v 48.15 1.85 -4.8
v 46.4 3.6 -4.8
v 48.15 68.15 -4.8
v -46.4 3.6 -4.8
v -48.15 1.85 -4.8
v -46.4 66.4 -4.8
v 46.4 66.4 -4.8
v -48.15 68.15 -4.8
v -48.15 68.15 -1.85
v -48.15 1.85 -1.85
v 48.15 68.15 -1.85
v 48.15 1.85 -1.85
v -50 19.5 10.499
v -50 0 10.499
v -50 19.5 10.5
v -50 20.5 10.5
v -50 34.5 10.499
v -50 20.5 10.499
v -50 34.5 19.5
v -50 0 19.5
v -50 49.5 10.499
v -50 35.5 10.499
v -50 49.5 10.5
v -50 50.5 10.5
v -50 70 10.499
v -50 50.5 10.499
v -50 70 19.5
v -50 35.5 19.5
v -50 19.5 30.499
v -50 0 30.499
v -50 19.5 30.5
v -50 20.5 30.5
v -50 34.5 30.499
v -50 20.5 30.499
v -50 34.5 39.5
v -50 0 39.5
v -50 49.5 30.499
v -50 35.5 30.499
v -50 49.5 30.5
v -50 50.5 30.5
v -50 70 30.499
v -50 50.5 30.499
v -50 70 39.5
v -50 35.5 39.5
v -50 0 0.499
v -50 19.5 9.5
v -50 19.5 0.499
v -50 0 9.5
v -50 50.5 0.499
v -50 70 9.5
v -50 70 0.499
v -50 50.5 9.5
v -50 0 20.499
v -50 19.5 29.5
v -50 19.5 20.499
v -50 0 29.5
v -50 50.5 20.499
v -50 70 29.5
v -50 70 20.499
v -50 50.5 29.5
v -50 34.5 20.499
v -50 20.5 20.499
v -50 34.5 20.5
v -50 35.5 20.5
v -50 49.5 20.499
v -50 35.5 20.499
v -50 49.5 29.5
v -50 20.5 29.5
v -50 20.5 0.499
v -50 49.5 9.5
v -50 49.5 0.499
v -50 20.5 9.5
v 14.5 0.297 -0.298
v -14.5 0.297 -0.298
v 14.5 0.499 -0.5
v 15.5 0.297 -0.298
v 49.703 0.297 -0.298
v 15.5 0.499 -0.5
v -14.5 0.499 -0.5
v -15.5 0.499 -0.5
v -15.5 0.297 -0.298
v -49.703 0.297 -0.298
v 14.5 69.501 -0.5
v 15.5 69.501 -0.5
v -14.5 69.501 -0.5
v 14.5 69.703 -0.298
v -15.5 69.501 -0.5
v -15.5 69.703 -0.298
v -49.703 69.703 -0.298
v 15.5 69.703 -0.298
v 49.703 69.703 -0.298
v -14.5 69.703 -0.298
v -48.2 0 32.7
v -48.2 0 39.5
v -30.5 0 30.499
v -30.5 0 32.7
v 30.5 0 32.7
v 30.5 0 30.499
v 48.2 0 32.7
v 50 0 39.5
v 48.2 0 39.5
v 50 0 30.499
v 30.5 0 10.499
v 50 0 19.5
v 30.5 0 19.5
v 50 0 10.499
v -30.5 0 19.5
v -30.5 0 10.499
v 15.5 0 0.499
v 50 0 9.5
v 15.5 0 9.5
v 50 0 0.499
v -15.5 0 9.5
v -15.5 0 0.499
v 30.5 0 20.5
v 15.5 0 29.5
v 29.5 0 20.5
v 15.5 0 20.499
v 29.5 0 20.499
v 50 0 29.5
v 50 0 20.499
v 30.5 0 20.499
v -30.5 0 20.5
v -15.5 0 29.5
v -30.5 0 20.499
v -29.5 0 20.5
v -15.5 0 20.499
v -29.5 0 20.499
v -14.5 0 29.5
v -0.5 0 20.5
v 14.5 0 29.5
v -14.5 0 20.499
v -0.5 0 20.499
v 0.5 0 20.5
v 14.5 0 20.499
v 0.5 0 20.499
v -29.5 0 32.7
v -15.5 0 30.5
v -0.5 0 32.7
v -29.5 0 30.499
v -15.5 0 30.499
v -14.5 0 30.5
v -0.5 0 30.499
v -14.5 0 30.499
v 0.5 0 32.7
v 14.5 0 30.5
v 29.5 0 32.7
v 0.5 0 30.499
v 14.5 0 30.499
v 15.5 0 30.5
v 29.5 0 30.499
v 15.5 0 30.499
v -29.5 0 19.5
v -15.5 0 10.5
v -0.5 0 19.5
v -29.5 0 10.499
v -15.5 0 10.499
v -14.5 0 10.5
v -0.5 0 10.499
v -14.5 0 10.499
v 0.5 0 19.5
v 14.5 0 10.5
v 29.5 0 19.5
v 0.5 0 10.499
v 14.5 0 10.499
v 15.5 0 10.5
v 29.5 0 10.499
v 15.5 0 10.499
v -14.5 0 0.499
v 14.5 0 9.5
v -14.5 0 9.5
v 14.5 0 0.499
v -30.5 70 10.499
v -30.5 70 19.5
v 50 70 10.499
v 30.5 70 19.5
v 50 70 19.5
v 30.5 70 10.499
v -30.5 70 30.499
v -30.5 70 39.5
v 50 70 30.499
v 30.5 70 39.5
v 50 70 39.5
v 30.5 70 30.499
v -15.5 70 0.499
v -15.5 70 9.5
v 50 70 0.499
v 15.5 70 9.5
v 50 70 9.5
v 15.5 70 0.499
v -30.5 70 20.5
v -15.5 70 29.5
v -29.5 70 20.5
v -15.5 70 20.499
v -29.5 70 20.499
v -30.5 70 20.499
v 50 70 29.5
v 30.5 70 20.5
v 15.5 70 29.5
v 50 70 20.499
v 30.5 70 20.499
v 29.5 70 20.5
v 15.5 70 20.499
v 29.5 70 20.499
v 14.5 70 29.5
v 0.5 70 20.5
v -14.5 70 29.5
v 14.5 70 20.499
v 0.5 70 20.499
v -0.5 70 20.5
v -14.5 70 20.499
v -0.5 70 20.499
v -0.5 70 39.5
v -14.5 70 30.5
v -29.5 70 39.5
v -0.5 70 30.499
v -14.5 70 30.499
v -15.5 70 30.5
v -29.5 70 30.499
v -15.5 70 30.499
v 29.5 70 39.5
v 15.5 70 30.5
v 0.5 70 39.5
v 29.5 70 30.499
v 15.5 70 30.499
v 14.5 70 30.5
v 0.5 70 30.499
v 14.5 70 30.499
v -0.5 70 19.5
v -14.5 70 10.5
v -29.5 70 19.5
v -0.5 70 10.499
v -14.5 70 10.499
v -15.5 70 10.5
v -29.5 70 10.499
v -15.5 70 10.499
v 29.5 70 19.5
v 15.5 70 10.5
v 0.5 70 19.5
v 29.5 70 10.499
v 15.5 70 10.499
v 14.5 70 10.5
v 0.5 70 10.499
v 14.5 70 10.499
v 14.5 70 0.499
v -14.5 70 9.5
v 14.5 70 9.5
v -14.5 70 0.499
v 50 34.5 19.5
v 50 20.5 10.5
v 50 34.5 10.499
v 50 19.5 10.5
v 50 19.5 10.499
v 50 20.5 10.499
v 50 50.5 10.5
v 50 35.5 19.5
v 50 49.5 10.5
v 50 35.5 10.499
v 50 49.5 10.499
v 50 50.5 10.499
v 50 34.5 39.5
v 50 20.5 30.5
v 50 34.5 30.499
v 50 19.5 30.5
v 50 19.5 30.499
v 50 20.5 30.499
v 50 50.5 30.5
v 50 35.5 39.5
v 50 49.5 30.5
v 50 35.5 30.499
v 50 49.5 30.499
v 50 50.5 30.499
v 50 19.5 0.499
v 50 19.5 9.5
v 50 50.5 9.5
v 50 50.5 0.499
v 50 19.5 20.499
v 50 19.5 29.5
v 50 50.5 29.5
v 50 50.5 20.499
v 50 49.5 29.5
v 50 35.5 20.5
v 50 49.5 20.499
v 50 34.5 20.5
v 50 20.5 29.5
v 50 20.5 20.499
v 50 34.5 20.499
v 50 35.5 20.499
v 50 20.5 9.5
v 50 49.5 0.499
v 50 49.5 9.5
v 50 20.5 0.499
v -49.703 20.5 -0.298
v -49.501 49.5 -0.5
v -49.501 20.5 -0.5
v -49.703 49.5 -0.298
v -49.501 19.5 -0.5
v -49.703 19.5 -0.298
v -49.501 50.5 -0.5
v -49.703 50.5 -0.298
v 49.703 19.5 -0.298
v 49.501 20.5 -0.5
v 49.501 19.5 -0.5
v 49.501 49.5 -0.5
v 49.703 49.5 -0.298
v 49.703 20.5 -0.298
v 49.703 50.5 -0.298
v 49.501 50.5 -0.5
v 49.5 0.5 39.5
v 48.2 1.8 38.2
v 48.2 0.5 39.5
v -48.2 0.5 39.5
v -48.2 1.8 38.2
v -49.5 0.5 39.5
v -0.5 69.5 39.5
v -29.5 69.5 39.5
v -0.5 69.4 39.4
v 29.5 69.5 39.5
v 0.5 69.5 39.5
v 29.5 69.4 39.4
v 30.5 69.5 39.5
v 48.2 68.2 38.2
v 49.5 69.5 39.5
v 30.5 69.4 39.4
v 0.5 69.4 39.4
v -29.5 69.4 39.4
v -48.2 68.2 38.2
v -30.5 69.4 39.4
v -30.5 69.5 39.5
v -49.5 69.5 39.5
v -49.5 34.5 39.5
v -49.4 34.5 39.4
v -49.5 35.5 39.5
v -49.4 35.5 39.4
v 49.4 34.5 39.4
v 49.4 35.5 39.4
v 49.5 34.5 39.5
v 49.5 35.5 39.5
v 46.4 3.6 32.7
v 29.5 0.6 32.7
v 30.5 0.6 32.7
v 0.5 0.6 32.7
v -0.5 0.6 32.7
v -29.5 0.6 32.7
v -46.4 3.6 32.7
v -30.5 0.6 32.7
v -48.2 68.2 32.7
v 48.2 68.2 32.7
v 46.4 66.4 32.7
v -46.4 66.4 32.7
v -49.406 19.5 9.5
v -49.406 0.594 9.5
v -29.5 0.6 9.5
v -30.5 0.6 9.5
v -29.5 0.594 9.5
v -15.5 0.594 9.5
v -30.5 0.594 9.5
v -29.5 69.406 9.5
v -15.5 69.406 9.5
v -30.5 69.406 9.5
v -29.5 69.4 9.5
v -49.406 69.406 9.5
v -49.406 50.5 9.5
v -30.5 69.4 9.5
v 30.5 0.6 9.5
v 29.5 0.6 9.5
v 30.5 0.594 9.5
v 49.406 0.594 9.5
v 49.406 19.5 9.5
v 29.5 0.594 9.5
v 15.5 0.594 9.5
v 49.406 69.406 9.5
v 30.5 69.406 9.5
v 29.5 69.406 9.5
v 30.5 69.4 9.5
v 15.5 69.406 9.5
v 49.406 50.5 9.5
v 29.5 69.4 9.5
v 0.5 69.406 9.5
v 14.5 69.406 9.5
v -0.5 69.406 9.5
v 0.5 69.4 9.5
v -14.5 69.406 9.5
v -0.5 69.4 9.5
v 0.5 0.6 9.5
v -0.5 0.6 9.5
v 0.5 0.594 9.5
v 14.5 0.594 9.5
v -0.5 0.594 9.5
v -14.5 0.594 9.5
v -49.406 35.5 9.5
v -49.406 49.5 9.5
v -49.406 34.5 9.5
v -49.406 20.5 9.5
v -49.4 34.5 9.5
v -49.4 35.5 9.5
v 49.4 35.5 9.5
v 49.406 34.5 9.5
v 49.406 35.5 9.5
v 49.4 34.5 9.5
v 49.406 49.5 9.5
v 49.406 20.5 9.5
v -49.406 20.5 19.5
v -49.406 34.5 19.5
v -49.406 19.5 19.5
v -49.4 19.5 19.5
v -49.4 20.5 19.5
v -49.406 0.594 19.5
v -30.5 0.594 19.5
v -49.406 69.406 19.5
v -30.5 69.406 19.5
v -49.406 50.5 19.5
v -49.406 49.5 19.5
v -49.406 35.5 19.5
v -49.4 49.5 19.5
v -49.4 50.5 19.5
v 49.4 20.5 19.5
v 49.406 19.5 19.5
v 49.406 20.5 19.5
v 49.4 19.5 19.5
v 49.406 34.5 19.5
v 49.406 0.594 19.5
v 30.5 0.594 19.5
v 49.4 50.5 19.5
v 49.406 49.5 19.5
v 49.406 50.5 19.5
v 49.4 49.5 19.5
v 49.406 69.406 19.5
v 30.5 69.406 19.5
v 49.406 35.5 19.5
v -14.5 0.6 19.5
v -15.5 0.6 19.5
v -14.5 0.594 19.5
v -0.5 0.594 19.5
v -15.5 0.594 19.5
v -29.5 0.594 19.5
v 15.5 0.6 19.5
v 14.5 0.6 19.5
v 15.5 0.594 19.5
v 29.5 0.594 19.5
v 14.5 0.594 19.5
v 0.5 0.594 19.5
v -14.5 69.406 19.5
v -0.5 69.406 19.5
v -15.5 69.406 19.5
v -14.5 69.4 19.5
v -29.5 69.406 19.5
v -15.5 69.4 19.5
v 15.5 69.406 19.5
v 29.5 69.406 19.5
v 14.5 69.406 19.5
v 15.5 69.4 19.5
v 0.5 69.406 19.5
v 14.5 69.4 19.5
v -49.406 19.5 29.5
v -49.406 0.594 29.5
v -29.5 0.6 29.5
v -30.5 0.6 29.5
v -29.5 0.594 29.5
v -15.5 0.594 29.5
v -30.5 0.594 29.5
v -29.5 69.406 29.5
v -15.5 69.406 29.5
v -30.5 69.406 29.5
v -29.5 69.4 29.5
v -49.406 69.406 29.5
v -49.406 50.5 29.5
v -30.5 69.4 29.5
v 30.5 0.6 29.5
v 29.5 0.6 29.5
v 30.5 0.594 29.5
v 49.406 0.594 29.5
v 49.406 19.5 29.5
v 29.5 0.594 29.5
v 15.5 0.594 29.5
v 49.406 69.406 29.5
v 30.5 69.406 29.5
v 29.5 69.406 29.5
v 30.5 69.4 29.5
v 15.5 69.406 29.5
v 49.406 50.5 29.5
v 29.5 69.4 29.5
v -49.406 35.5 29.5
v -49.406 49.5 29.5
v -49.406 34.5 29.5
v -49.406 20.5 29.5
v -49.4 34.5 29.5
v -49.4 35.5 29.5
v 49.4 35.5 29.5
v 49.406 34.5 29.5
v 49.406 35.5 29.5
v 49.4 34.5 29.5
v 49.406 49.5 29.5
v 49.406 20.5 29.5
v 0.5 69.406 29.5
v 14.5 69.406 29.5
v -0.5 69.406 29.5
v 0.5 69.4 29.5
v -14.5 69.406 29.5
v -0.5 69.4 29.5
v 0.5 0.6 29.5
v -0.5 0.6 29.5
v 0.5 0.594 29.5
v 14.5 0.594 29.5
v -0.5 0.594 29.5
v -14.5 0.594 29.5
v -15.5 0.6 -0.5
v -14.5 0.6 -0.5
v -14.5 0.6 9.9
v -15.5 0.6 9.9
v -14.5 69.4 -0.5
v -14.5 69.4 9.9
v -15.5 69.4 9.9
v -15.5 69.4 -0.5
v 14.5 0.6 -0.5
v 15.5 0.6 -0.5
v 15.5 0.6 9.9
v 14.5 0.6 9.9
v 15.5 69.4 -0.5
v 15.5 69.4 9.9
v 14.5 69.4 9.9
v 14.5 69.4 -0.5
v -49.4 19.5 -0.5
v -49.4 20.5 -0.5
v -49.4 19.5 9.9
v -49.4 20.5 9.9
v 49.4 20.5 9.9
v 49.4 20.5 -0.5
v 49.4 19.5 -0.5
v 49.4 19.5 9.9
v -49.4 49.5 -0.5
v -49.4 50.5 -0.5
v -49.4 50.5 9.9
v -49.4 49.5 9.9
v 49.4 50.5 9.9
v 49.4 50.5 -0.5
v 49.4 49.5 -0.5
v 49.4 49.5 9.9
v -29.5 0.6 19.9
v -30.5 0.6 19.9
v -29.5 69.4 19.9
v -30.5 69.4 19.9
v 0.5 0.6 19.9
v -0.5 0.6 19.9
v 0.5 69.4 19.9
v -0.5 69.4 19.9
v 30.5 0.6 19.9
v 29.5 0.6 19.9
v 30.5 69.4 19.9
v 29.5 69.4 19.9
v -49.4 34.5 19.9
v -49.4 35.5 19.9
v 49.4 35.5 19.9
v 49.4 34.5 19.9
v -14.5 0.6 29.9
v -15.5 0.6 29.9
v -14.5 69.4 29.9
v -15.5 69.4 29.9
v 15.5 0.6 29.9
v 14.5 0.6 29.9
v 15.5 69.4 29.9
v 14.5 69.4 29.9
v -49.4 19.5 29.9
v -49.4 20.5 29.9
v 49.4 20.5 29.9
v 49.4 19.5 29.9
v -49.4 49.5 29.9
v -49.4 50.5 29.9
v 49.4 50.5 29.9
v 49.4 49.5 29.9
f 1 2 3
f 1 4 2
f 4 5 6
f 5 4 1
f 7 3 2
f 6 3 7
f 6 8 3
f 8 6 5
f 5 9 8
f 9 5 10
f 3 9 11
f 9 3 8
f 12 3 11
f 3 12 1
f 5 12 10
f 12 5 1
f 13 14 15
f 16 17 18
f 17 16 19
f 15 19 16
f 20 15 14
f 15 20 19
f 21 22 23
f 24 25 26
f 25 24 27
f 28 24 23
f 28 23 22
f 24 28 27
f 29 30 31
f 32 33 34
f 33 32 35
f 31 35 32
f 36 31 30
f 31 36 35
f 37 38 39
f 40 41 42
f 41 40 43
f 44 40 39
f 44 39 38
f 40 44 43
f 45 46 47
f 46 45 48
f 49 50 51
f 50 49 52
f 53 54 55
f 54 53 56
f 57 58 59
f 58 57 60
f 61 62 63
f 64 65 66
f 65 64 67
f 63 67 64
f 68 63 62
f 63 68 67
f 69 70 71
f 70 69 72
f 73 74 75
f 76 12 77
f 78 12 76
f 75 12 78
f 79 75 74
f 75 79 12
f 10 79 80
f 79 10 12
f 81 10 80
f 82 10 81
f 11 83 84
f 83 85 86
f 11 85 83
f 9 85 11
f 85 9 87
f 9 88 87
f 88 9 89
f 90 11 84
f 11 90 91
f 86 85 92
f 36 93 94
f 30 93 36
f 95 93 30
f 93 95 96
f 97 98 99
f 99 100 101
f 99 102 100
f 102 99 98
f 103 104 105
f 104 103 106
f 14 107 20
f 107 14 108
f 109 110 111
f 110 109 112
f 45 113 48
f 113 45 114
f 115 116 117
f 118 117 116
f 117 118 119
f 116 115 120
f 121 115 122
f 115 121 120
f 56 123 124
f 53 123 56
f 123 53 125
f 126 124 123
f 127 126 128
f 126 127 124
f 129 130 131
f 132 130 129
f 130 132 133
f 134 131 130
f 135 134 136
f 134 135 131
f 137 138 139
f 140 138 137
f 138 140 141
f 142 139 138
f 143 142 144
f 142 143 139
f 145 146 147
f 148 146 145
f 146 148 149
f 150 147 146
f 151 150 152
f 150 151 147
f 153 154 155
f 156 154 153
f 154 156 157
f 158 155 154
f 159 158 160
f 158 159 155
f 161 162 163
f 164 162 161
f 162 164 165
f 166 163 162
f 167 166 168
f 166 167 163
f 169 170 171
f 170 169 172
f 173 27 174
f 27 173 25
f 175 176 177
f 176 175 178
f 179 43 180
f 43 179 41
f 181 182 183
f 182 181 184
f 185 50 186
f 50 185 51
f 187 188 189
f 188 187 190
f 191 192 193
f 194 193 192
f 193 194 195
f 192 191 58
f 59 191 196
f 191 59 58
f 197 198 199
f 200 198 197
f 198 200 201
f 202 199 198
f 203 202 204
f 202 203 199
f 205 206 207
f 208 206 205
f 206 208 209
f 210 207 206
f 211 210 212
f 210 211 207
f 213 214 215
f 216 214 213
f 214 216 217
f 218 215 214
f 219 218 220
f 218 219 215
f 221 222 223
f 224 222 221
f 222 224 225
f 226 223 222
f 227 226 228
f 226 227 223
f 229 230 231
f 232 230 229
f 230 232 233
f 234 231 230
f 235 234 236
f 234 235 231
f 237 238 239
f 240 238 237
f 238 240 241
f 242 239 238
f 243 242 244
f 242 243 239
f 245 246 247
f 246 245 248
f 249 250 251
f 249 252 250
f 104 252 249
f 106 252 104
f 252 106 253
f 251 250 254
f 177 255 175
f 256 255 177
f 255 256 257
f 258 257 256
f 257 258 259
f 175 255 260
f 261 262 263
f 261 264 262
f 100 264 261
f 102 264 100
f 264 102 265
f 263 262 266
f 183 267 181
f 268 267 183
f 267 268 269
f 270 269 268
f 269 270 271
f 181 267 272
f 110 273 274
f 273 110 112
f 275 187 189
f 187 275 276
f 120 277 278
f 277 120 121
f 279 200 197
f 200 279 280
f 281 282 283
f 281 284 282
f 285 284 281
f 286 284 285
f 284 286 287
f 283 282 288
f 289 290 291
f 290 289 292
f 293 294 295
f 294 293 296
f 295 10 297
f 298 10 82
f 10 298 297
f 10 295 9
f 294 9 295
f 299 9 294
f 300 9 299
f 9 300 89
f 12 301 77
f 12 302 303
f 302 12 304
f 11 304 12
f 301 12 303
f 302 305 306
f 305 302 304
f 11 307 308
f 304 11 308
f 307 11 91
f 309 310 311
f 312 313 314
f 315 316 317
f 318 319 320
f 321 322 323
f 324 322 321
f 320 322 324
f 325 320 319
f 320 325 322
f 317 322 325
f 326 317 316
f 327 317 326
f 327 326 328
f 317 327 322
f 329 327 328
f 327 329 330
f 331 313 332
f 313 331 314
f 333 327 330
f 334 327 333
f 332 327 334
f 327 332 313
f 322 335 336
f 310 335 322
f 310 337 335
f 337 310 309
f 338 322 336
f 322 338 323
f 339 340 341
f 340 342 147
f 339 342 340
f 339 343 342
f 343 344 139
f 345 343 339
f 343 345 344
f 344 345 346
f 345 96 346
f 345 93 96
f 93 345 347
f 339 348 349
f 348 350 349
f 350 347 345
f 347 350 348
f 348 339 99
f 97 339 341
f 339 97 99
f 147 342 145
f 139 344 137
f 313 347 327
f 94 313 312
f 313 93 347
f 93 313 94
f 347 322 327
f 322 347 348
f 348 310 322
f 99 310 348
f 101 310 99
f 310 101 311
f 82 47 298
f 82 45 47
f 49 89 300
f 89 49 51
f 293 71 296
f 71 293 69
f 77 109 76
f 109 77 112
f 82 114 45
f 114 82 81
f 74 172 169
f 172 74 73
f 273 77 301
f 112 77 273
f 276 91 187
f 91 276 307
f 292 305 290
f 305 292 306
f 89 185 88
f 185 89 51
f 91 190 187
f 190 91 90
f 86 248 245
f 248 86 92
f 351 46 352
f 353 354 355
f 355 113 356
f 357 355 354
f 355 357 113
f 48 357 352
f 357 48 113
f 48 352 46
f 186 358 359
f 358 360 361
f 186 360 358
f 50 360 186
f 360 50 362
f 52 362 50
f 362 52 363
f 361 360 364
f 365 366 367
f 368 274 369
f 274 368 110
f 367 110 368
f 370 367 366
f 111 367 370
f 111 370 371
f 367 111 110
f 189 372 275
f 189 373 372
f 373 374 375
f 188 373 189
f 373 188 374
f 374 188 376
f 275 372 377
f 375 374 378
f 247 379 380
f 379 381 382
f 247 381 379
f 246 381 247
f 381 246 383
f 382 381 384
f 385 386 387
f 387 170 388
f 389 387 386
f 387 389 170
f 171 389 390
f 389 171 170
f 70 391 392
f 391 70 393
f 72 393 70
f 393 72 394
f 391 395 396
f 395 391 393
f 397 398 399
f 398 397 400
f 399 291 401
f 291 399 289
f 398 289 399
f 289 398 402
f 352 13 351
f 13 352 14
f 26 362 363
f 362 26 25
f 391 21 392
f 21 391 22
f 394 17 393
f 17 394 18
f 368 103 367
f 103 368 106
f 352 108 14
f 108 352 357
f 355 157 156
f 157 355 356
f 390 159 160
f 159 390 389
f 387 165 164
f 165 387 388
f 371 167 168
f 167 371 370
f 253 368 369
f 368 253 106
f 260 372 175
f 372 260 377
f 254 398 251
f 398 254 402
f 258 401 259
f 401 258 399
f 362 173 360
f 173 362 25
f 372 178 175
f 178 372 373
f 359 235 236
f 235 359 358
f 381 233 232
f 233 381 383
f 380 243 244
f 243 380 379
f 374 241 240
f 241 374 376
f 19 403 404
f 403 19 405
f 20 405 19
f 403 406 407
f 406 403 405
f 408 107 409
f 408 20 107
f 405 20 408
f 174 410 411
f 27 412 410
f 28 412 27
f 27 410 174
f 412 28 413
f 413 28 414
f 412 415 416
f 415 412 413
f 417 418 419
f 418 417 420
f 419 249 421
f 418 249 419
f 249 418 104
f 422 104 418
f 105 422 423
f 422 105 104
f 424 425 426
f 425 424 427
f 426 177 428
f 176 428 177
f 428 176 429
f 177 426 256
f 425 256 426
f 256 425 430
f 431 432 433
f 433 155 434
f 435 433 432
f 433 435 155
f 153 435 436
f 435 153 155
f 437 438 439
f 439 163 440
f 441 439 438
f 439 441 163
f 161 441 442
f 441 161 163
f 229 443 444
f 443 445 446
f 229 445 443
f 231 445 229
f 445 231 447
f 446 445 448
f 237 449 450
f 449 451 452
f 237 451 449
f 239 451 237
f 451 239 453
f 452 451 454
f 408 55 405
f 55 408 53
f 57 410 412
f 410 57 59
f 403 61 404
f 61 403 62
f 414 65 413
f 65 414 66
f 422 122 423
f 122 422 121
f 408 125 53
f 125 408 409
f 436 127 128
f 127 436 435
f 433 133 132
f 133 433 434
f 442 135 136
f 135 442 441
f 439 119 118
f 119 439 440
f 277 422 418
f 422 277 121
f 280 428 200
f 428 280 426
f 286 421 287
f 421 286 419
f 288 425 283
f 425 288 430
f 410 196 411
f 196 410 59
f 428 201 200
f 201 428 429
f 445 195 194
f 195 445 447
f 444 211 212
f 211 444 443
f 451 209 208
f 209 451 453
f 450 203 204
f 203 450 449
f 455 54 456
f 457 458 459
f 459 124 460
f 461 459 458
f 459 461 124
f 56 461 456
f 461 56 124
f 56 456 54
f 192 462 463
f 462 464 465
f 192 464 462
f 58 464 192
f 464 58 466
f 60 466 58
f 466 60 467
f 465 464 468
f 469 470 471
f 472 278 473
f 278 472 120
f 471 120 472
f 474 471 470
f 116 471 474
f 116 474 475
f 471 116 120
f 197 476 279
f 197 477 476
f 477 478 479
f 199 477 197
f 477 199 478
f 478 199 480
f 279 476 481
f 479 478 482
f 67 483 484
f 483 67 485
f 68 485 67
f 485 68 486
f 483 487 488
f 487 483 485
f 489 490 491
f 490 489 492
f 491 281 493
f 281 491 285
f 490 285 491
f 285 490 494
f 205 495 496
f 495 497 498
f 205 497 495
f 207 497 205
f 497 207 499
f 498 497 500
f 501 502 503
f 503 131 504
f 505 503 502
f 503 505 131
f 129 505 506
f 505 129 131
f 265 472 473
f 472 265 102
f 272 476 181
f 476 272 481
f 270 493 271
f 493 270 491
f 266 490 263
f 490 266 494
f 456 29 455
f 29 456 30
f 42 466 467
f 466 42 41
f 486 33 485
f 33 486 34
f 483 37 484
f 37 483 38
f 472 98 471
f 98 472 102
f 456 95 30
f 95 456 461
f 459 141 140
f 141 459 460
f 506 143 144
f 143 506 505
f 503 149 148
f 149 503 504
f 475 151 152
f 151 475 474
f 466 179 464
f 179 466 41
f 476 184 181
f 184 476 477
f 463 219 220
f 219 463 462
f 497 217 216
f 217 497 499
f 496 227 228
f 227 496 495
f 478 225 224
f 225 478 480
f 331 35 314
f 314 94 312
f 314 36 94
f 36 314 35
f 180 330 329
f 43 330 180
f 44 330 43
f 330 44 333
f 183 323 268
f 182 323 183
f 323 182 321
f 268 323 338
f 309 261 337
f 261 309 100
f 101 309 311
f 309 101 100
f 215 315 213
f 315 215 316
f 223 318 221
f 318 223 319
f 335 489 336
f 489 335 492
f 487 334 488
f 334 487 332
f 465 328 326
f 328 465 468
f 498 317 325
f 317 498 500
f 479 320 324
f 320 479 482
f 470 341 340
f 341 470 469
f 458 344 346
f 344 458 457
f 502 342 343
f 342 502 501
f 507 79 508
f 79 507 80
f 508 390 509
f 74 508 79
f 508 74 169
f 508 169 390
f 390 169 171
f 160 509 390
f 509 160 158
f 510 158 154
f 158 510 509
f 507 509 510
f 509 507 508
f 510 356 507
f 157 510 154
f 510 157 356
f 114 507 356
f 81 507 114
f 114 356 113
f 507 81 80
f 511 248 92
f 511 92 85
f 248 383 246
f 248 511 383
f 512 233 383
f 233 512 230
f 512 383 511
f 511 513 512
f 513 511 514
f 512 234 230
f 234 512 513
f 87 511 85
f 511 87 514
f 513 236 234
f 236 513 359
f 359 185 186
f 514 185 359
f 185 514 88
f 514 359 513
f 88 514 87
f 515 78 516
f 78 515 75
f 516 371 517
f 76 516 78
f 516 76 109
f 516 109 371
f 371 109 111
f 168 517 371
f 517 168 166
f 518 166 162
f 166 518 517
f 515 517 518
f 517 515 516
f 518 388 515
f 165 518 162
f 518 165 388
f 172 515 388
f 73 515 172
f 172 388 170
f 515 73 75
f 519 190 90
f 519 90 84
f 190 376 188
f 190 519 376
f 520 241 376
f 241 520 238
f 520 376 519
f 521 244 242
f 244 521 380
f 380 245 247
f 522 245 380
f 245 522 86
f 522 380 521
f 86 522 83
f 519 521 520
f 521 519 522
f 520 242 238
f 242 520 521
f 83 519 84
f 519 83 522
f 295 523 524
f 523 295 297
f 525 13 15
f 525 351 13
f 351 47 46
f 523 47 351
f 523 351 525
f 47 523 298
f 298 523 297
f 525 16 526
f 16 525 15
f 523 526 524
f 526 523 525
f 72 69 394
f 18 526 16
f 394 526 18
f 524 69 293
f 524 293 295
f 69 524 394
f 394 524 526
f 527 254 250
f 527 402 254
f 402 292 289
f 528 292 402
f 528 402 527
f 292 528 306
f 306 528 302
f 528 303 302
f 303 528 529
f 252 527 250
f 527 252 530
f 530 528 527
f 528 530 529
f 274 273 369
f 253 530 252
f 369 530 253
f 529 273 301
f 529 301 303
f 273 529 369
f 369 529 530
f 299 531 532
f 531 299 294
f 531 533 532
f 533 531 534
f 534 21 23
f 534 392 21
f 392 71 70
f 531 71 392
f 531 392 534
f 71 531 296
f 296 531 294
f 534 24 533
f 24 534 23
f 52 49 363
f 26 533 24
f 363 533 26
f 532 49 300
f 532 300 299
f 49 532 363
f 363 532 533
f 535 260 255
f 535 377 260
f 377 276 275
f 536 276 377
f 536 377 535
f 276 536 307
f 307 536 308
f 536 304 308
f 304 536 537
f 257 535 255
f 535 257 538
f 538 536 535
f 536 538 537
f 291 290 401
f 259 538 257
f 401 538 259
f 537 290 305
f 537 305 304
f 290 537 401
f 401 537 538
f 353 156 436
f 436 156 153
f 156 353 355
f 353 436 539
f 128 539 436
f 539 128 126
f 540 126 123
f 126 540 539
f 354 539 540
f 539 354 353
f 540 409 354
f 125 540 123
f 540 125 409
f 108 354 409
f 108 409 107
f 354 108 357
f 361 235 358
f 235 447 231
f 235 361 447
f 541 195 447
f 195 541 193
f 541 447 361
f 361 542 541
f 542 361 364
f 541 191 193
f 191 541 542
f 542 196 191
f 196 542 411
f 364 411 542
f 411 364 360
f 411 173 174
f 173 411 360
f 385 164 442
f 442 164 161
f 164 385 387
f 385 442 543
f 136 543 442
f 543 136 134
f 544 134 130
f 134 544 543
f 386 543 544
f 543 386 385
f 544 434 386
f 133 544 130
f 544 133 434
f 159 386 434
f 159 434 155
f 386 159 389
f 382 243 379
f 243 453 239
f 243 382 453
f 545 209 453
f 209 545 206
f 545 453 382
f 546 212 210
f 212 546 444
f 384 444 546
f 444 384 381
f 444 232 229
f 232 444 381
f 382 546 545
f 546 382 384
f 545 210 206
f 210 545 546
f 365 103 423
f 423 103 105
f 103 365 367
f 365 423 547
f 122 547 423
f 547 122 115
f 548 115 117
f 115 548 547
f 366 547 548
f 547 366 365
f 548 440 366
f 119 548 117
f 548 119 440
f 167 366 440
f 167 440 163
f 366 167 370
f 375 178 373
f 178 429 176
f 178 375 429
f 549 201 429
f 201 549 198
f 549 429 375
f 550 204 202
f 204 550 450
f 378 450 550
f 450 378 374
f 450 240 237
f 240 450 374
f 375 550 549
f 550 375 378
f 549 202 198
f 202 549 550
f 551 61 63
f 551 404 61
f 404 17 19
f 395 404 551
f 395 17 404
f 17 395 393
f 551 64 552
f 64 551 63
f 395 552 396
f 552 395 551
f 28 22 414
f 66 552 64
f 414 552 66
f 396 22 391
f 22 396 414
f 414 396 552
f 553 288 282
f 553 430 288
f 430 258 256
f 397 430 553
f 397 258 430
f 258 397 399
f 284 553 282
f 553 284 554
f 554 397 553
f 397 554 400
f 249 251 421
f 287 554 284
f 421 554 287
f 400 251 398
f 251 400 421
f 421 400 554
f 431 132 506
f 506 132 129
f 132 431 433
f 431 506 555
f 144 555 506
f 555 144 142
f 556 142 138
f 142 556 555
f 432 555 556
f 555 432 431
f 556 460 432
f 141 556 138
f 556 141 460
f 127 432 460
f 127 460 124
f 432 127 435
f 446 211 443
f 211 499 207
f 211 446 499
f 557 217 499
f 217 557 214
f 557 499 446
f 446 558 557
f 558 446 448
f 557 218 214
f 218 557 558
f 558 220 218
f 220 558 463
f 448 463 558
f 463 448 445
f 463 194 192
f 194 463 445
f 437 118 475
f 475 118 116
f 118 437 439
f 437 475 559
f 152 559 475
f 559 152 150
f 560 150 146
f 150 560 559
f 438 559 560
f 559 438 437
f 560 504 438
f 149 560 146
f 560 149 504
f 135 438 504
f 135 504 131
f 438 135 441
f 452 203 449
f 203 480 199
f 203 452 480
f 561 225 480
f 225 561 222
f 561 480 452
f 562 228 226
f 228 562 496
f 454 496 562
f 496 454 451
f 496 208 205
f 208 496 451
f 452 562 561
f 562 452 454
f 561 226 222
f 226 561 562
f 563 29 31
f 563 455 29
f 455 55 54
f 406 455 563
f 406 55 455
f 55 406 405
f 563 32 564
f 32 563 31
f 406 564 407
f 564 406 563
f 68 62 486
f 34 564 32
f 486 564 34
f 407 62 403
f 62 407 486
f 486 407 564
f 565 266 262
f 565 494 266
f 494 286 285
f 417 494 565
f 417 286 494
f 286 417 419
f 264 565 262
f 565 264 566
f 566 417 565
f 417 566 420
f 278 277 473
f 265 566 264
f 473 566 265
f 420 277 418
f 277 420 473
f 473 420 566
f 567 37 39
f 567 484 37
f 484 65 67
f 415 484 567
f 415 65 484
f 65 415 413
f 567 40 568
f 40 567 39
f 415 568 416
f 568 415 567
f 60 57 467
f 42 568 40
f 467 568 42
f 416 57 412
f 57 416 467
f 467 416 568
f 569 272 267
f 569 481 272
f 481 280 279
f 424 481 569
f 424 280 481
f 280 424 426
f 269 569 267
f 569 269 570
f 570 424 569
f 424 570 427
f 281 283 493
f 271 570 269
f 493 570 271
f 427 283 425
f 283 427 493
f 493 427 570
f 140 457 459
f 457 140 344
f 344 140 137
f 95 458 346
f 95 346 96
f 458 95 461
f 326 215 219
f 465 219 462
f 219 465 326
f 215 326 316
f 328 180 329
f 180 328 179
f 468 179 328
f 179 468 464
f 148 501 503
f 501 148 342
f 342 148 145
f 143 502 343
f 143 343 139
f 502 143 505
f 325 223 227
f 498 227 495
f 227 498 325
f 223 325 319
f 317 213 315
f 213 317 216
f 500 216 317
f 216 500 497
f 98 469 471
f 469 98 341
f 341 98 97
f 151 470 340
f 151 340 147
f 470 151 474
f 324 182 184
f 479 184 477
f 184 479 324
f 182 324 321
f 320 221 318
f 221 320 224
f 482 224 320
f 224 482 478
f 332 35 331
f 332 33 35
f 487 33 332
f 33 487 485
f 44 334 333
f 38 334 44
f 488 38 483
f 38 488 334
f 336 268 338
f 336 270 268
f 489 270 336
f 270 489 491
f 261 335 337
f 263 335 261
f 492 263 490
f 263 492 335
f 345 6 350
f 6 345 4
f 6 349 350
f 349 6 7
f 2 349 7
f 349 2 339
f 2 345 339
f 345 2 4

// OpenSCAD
// file: ../../lib/chimney.scad
// advent-chimney — shared dimensions and geometry. Renders nothing on its own.
//
// One frame for every model, the USE frame of a single section: x across the
// chimney's front, y from the front face (y = 0) back, z up from the
// section's bottom (z = 0). The chimney's footprint is centred on x = 0.
//
// Every joint in the stack is the same. The piece below has a POCKET in its
// top: its wall cut back to a thin outer rim, open upward, the rim's top
// bevelled 45° inward. The gate plate lies on the pocket's floor and slides
// out through a notch in the front wall, also open upward, so nothing about
// the gate is ever printed over air. The piece above has a RING under it:
// the inner part of its wall hanging down into the pocket over the plate,
// its outside bevelled 45° to sit on the rim's bevel. The ring lines the
// pieces up. The fireplace's top is a pocket (day 1), every section has a
// ring under and a pocket on top, and the cloud has a plug that fills the
// top section's empty pocket.

$fn = 64;

// ---- Chimney section -----------------------------------------------------
ch_w  = 100;     // outside width, across the front
ch_d  = 70;      // outside depth, front to back
ch_h  = 40;      // height of one section (the stack's pitch)
wall  = 3.6;     // wall thickness at the brick faces

in_w = ch_w - 2 * wall;     // shaft inside, 92.8
in_d = ch_d - 2 * wall;     // 62.8

// ---- Bricks (mortar is a recessed groove) --------------------------------
course   = 10;   // brick course height, mortar included; ch_h is 4 courses
pitch    = 30;   // brick length, mortar included
mortar   = 1.0;  // mortar line width
mortar_d = 0.6;  // how deep the mortar is set back from the brick face
min_brick = 5;   // shortest brick end left at a corner

assert(abs(ch_h / course - round(ch_h / course)) < 1e-6
       && round(ch_h / course) % 2 == 0,
       "a section must be an even number of courses, or the bond breaks between sections");

// ---- Stacking joint and gate --------------------------------------------
groove_d  = 1.8;  // how far the pocket reaches into the walls
rim       = wall - groove_d;  // the pocket's outer rim (1.2 behind the mortar)
ring_v    = 3.0;  // straight part of the ring under a piece, below its bevel;
                  //   the length that grips the pocket wall
joint_gap = 0.05; // ring to pocket wall, per side (tight: pushing a section
                  //   in takes effort; 0.15 printed loose)

gate_t    = 2.0;  // plate thickness
gate_side = 0.6;  // plate edge to pocket wall, per side (loose, it slides;
                  //   0.3 printed tight)
gate_vgap = 0.5;  // plate to the ring above it (0.2 printed tight)

// pocket depth below the joint: bevel, the ring's straight part, the plate
pocket_d = rim + ring_v + gate_vgap + gate_t;
gate_z   = ch_h - pocket_d;   // plate underside, in the section below's frame

assert(rim >= mortar_d + 1.2, "pocket rim too thin behind the mortar");
assert(wall - rim - joint_gap >= 1.2, "ring under a section too thin");

// ---- Helpers -------------------------------------------------------------

// Rectangle of the chimney's footprint, grown by `o` (negative shrinks).
module ch_rect(o = 0)
    translate([-ch_w / 2 - o, -o]) square([ch_w + 2 * o, ch_d + 2 * o]);

// A flat slice of a 2D shape, z in [z0, z0 + h].
module slab(z0, h) translate([0, 0, z0]) linear_extrude(h) children();

// ---- Brick texture -------------------------------------------------------

// Head-joint positions along a face `len` long, centred on 0, for a course
// of parity `p`. Odd and even courses are shifted half a brick, and corners
// alternate long and short ends.
function head_joints(len, p) =
    [for (i = [-20:20]) let(x = (p == 0 ? pitch / 2 : 0) + i * pitch)
        if (abs(x) < len / 2 - min_brick) x];

// The mortar to cut out of a w x d box (front face at y = y0, centred on
// x = 0), courses from z0 to z1 with bed joints on every multiple of
// `course`. Bed joints have a 45° roof so they print without support.
// `course0` is the global index of the course starting at z0, so the bond
// carries on across pieces. `top_open`: z1 is the piece's top face (a
// section's), and its joint is a plain step; otherwise something wider sits
// on z1 (the fireplace's corbel) and the bricks just end there.
// `bottom_cut`: how far the bottom joint's cut reaches below z0, to clear
// the bevelled ring hanging under a section instead of leaving a sliver.
module mortar_cut(w, d, z0, z1, y0 = 0, course0 = 0, top_open = true,
                  bottom_cut = 0) {
    n = round((z1 - z0) / course);
    // bed joints
    for (k = [0:top_open ? n : n - 1]) {
        zk = z0 + k * course;
        lo = k == 0 ? bottom_cut : 0;
        difference() {
            translate([-w / 2 - 1, y0 - 1, zk - mortar / 2 - lo])
                cube([w + 2, d + 2, mortar + lo]);
            // the top joint has nothing above it: a plain step, no feather
            if (k == n && top_open)
                translate([-w / 2 + mortar_d, y0 + mortar_d, zk - mortar / 2 - 0.01])
                    cube([w - 2 * mortar_d, d - 2 * mortar_d, mortar + 0.02]);
            else hull() {
                translate([-w / 2 + mortar_d, y0 + mortar_d, zk - mortar / 2 - lo - 0.01])
                    cube([w - 2 * mortar_d, d - 2 * mortar_d,
                          mortar - mortar_d + lo + 0.01]);
                translate([-w / 2, y0, zk + mortar / 2 - 0.001])
                    cube([w, d, 0.002]);
            }
        }
    }
    // head joints, one course at a time
    for (k = [0:n - 1]) {
        zk = z0 + k * course;
        p = (course0 + k) % 2;
        for (x = head_joints(w, p)) {
            translate([x, y0, zk]) head_cut();                          // front
            translate([x, y0 + d, zk]) mirror([0, 1, 0]) head_cut();    // back
        }
        for (yy = head_joints(d, p)) {
            translate([-w / 2, y0 + d / 2 + yy, zk]) rotate([0, 0, -90]) head_cut();
            translate([ w / 2, y0 + d / 2 + yy, zk]) rotate([0, 0,  90]) head_cut();
        }
    }
}

// One head joint on a face whose outside is -y, for the course starting at
// z = 0. It runs from inside the bed joint below to the bed joint above and
// its top follows that joint's 45° roof, so the two leave no sliver between.
module head_cut()
    hull() {
        translate([-mortar / 2, -1, -mortar / 2]) cube([mortar, 1, course + mortar]);
        translate([-mortar / 2, -1, -mortar / 2])
            cube([mortar, 1 + mortar_d, course + mortar - mortar_d]);
    }

// ---- Joint ---------------------------------------------------------------
// Both modules work in the JOINT frame: z = 0 is the joint line, the top of
// the piece below and the bottom edge of the piece above.

// What to cut from the top of the piece below: the rim's 45° bevel and the
// pocket. With `gate` the pocket is deep enough for the plate and has the
// front notch it slides out through.
module pocket_cut(gate = true) {
    d = gate ? pocket_d : rim + ring_v + gate_vgap;
    hull() {
        slab(-rim, 0.001) ch_rect(-rim);
        slab(1, 0.001) ch_rect(1);      // the 45° line through the outer edge
    }
    slab(-d, d + 1) ch_rect(-rim);
    if (gate)
        translate([-(in_w / 2 + groove_d), -1, -d])
            cube([in_w + 2 * groove_d, rim + 2, d + 2]);
}

// The ring under the piece above, solid (the caller cuts its shaft): a
// straight part inside the pocket, then the 45° bevel out to the outer edge
// that sits on the rim's bevel.
// (Not one hull: the bevel widens upward, so a hull would run straight from
// the straight part's bottom edge to the top and bulge past the bevel.)
module ring_solid() {
    slab(-(rim + ring_v), ring_v - joint_gap + 0.001) ch_rect(-(rim + joint_gap));
    hull() {
        slab(-(rim + joint_gap), 0.001) ch_rect(-(rim + joint_gap));
        slab(-0.001, 0.001) ch_rect(0);
    }
}
// main file
// section — one of the 24 chimney sections, all identical.
//
// A brick tube 100 x 70 x 40. The pocket in its top holds the gate that is
// the NEXT section's floor: the plate lies on the pocket's floor, slides out
// through a notch in the front wall, and the ring under the section above
// closes the pocket over it. Pull the gate and whatever sat on it drops down
// the open shaft to the fireplace. (Day 1's gate is in the fireplace's top;
// the top section's pocket is filled by the cloud.)
//
// Prints upright, as it stands: the pocket and the notch are open upward and
// the ring underneath is bevelled 45°, so nothing needs support.

include <../../lib/chimney.scad>

module section() {
    difference() {
        union() {
            slab(0, ch_h) ch_rect();
            ring_solid();
        }
        // shaft
        slab(-ch_h, 3 * ch_h) ch_rect(-wall);
        translate([0, 0, ch_h]) pocket_cut(gate = true);
        mortar_cut(ch_w, ch_d, 0, ch_h, bottom_cut = mortar_d);
    }
}

section();
